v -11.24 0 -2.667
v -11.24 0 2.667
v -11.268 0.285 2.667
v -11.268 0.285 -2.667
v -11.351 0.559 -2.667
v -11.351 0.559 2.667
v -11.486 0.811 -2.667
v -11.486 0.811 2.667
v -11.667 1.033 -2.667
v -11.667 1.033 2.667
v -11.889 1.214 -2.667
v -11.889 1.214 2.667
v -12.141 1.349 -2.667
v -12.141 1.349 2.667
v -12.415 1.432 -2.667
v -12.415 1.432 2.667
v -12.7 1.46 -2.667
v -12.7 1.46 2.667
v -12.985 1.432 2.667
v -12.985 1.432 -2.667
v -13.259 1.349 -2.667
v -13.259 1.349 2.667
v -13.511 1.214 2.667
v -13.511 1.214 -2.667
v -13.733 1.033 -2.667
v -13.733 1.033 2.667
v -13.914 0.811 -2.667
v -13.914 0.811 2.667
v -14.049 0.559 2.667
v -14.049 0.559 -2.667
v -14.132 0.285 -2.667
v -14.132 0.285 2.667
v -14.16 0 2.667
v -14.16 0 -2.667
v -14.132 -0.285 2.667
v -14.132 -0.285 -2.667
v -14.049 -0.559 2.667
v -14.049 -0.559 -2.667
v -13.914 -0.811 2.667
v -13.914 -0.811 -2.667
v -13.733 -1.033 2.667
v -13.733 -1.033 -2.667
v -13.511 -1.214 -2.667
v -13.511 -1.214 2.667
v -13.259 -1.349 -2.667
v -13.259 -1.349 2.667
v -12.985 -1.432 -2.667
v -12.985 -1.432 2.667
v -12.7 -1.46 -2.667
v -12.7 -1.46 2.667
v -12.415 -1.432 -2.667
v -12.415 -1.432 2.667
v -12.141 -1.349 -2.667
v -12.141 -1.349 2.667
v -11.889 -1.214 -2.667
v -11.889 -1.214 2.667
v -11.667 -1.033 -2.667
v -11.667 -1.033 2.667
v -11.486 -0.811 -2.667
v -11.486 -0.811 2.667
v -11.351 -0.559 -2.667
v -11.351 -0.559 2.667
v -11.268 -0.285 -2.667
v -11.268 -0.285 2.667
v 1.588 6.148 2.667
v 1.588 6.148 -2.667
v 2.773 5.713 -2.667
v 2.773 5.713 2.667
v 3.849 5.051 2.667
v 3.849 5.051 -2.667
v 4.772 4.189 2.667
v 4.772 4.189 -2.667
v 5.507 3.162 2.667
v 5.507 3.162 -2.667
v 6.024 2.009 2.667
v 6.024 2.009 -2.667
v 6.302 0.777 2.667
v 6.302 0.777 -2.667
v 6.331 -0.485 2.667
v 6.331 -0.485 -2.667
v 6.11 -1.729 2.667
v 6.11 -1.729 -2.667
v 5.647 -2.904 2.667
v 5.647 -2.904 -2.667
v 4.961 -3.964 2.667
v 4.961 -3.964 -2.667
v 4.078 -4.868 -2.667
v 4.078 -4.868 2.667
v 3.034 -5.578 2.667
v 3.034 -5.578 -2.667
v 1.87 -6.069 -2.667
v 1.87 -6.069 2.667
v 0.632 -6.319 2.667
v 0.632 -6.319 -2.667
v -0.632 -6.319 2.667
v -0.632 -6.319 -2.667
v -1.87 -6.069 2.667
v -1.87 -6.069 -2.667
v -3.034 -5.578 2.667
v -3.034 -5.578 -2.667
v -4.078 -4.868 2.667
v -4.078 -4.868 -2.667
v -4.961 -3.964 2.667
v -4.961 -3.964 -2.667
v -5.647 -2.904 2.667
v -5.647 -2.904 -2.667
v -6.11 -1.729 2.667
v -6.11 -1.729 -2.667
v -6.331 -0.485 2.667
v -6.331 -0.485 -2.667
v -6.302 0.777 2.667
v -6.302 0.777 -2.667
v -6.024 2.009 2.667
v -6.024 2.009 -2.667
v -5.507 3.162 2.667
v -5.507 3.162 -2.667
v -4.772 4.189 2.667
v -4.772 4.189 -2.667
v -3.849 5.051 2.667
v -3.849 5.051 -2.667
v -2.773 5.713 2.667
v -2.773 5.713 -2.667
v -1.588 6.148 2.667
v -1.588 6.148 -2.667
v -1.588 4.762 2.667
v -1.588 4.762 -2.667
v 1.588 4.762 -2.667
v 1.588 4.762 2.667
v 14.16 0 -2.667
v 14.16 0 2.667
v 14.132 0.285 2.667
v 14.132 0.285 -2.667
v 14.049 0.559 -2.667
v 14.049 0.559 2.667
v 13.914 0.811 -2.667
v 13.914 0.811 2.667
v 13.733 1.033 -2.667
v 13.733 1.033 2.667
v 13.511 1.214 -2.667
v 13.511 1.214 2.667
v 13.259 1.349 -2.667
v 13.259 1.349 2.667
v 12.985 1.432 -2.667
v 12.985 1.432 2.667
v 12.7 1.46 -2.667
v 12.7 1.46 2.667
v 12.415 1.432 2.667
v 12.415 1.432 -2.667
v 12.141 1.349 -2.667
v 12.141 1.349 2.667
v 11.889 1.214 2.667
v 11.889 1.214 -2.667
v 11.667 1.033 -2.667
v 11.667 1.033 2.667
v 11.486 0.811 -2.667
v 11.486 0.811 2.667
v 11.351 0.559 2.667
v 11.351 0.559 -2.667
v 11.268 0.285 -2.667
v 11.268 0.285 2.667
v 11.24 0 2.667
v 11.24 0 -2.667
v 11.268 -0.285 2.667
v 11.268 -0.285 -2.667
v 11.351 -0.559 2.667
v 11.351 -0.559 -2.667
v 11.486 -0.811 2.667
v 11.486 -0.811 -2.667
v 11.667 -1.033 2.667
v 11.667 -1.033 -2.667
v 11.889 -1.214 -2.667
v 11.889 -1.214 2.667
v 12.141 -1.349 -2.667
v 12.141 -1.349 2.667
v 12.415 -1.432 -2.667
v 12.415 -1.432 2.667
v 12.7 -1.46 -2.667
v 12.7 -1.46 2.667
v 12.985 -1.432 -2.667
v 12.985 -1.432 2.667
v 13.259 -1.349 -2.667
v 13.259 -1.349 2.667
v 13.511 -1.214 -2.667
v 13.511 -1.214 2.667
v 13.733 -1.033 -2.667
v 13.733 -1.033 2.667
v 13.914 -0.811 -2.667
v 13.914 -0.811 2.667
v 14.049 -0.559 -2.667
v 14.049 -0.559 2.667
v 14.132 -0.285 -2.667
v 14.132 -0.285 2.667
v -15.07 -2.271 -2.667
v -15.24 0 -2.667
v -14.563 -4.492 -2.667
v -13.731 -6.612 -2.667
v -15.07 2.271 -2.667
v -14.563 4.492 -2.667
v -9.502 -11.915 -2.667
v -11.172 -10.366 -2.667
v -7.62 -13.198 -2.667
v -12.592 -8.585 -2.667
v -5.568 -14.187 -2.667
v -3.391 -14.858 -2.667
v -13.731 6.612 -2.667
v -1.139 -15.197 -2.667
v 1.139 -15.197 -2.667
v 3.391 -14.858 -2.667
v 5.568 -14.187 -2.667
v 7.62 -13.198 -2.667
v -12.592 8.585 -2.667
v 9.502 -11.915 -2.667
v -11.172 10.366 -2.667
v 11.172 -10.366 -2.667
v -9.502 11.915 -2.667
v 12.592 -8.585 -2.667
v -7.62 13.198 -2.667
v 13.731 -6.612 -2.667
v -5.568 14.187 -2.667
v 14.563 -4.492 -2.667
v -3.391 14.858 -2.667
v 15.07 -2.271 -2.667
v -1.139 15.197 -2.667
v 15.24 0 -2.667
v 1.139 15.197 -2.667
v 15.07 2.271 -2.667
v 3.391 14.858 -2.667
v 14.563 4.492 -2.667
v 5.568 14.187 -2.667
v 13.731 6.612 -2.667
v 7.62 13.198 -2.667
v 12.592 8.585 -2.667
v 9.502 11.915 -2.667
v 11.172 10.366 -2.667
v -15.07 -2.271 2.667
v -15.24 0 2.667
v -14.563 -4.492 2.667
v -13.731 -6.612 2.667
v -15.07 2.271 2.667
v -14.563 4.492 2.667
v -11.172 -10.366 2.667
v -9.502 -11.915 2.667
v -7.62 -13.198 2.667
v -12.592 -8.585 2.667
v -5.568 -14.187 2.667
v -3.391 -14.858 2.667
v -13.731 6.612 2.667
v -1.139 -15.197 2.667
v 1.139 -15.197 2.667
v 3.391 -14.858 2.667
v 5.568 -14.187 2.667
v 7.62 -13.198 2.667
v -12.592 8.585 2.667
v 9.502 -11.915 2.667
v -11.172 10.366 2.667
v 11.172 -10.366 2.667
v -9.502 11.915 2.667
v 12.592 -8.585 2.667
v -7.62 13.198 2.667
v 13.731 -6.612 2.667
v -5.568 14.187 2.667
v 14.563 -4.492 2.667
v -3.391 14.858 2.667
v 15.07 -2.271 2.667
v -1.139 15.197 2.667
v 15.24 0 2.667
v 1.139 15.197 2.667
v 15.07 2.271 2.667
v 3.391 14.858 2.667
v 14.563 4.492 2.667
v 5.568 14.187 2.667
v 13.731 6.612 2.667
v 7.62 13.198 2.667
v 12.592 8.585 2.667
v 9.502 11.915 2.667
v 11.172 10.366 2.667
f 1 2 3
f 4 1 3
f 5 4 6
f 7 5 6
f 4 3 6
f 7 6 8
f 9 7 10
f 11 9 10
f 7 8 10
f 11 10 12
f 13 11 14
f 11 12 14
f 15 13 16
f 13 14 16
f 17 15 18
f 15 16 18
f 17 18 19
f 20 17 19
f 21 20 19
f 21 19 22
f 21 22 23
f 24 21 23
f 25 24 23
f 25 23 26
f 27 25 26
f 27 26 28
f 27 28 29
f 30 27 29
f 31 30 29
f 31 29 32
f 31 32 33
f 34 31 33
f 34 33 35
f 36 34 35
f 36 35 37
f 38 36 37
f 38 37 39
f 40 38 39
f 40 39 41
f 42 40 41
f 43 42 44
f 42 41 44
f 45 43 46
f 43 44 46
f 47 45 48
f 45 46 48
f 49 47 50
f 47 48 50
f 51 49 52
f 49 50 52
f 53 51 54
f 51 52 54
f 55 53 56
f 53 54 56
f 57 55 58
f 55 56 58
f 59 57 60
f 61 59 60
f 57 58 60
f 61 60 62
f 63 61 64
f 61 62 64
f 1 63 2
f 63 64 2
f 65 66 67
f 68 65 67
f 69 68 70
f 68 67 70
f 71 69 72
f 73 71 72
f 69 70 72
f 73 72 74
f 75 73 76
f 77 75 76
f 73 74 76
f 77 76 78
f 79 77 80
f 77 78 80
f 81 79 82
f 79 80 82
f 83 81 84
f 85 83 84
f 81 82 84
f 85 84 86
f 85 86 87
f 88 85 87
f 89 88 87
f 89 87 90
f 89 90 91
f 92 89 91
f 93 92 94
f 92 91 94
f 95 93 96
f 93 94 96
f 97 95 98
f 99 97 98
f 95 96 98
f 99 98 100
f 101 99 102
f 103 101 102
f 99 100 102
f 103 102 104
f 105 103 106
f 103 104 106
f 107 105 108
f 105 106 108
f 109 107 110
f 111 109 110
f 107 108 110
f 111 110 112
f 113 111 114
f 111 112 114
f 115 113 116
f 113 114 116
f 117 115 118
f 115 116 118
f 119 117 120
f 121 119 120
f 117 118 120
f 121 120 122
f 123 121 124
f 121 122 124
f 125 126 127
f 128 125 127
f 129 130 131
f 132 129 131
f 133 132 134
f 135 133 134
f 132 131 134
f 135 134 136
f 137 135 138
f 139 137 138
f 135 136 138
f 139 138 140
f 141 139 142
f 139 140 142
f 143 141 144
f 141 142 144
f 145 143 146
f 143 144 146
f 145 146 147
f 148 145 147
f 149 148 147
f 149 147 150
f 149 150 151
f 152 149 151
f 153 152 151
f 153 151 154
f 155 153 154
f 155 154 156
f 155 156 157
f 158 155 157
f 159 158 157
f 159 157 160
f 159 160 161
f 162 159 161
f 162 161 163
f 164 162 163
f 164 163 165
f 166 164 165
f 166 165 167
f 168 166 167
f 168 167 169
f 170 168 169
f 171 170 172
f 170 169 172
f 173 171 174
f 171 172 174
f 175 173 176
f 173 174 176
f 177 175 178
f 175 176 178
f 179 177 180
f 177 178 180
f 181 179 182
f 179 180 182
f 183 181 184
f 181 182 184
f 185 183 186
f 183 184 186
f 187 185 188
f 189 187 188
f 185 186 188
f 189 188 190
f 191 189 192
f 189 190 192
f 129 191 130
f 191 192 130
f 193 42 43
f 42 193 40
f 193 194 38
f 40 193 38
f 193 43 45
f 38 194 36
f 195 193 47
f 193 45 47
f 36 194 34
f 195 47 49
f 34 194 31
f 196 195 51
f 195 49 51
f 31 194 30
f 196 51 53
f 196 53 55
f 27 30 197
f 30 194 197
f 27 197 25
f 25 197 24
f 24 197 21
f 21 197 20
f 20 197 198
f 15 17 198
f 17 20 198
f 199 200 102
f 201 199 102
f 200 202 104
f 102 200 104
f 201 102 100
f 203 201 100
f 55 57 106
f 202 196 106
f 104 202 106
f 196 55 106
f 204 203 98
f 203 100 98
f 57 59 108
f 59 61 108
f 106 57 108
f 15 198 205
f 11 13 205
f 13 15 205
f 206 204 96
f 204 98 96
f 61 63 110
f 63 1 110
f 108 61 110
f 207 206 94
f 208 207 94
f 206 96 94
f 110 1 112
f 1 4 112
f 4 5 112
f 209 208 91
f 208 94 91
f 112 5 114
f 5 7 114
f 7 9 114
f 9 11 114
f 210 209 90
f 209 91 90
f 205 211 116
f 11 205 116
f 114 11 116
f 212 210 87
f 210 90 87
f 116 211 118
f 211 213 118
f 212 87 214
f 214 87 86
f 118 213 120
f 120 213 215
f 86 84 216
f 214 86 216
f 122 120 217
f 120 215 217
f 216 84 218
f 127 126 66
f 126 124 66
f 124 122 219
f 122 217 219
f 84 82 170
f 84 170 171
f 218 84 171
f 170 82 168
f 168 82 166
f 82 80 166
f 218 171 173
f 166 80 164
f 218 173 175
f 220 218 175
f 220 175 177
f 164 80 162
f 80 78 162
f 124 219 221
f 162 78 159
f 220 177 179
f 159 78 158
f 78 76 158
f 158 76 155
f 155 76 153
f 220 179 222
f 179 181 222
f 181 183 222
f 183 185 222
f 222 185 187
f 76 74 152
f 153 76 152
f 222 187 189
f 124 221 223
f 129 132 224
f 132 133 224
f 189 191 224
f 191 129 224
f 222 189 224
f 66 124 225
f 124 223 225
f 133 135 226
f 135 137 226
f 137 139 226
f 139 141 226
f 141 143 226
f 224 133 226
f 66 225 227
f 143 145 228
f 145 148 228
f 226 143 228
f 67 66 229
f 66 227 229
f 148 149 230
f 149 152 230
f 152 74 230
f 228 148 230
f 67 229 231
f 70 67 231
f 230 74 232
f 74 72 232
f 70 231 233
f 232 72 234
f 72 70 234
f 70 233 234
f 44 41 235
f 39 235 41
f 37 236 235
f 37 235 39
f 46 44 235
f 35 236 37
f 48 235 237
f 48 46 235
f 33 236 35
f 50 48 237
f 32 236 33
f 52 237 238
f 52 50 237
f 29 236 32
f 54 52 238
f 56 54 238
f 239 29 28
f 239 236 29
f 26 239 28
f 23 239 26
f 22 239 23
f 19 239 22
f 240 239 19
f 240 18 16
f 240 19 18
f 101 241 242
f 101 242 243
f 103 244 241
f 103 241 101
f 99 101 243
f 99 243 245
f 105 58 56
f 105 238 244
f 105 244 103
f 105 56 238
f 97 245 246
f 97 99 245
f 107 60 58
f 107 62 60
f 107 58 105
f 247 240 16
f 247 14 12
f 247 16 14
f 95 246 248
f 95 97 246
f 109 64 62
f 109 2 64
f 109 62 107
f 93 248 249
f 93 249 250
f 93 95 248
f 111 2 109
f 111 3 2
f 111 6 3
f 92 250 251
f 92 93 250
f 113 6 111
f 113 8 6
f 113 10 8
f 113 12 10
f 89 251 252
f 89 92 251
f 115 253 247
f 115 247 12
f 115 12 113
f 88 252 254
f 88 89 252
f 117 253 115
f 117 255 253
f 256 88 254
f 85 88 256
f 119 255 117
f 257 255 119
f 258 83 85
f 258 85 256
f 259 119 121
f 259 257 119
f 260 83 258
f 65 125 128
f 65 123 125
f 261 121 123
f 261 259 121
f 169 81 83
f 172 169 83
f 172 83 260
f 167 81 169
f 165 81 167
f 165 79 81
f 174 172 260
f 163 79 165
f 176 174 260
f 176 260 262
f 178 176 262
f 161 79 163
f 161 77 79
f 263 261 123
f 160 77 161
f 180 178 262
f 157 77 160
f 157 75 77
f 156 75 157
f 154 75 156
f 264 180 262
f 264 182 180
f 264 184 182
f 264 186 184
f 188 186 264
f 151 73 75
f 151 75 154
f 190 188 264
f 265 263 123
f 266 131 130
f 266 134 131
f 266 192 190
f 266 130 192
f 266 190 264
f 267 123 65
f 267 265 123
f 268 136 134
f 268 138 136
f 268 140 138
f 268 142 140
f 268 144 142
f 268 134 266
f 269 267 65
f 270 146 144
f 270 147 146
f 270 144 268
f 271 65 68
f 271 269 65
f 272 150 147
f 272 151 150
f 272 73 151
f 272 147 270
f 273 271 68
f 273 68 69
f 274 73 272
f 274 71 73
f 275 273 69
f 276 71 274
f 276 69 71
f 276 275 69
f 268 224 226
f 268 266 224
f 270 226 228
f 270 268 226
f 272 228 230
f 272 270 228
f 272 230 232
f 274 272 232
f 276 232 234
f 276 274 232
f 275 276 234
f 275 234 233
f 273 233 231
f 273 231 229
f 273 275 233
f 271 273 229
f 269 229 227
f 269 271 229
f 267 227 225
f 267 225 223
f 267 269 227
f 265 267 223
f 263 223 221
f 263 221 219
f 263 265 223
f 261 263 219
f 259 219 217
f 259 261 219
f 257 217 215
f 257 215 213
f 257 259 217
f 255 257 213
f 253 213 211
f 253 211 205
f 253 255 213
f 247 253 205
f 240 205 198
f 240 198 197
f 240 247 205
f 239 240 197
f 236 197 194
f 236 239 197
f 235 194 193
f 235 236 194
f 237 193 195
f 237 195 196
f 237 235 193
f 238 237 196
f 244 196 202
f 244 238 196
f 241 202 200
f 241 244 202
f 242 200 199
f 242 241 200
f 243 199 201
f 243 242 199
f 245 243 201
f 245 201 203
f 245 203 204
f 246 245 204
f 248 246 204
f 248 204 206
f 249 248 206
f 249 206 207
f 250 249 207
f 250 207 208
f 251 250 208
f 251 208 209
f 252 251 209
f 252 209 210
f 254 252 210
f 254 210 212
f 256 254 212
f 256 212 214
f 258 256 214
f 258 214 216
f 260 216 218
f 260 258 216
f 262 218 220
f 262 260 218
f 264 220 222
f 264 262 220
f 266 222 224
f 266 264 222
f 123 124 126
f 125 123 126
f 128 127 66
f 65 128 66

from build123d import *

# Parameters (mm, degrees)
SKETCH1_R                       = 15.24
SKETCH1_R_2                     = 9.144
BOSS_EXTRUDE1_DEPTH             = 2.667
SKETCH2_R                       = 1.4605
CUT_EXTRUDE1_DEPTH              = 23.202854681
BOSS_EXTRUDE2_REACH             = 23.717
SKETCH3_R                       = 9.525
BOSS_EXTRUDE2_DIRECTION_2_REACH = 23.717


with BuildPart() as part:
    # Sketch1 → Boss-Extrude1 (new, symmetric)
    with BuildSketch(Plane.XY):
        Circle(SKETCH1_R)
        Circle(SKETCH1_R_2, mode=Mode.SUBTRACT)
    extrude(amount=BOSS_EXTRUDE1_DEPTH, both=True)

    # Sketch2 → Cut-Extrude1 (cut, through all)
    with BuildSketch(Plane.XY.offset(2.667)):
        with Locations((12.7, 0)):
            Circle(SKETCH2_R)
        with Locations((-12.7, 0)):
            Circle(SKETCH2_R)
    extrude(amount=-CUT_EXTRUDE1_DEPTH, mode=Mode.SUBTRACT)

    # Boss-Extrude2: up to this face of the body (flat: up to its plane)
    boss_extrude2_end = Plane(part.part.faces().sort_by_distance((-14.808947706, 0, 2.667))[0])
    # Sketch3 → Boss-Extrude2 (add, up to the picked face)
    with BuildSketch(Plane.XY, mode=Mode.PRIVATE) as boss_extrude2_sk1:
        Circle(SKETCH3_R)
        with BuildLine():
            Line((-1.5875, 6.148361062), (-1.5875, 4.7625))
            Line((-1.5875, 4.7625), (1.5875, 4.7625))
            Line((1.5875, 4.7625), (1.5875, 6.148361062))
            ThreePointArc((1.5875, 6.148361062), (0, -6.35), (-1.5875, 6.148361062))
        make_face(mode=Mode.SUBTRACT)
    boss_extrude2_tool1 = split(extrude(boss_extrude2_sk1.sketch, amount=BOSS_EXTRUDE2_REACH, mode=Mode.PRIVATE), bisect_by=boss_extrude2_end, keep=Keep.BOTH, mode=Mode.PRIVATE)
    add(boss_extrude2_tool1.solids().sort_by(Axis((-9.255592, 0, 0), (0, 0, 1)))[0])

    # Boss-Extrude2 direction 2: up to this face of the body (flat: up to its plane)
    boss_extrude2_direction_2_end = Plane(part.part.faces().sort_by_distance((-14.808947706, 0, -2.667))[0])
    # Sketch3 → Boss-Extrude2 direction 2 (add, up to the picked face)
    with BuildSketch(Plane.XY, mode=Mode.PRIVATE) as boss_extrude2_direction_2_sk1:
        Circle(SKETCH3_R)
        with BuildLine():
            Line((-1.5875, 6.148361062), (-1.5875, 4.7625))
            Line((-1.5875, 4.7625), (1.5875, 4.7625))
            Line((1.5875, 4.7625), (1.5875, 6.148361062))
            ThreePointArc((1.5875, 6.148361062), (0, -6.35), (-1.5875, 6.148361062))
        make_face(mode=Mode.SUBTRACT)
    boss_extrude2_direction_2_tool1 = split(extrude(boss_extrude2_direction_2_sk1.sketch, amount=-BOSS_EXTRUDE2_DIRECTION_2_REACH, mode=Mode.PRIVATE), bisect_by=boss_extrude2_direction_2_end, keep=Keep.BOTH, mode=Mode.PRIVATE)
    add(boss_extrude2_direction_2_tool1.solids().sort_by(Axis((-9.255592, 0, 0), (0, 0, -1)))[0])


solid = part.part
